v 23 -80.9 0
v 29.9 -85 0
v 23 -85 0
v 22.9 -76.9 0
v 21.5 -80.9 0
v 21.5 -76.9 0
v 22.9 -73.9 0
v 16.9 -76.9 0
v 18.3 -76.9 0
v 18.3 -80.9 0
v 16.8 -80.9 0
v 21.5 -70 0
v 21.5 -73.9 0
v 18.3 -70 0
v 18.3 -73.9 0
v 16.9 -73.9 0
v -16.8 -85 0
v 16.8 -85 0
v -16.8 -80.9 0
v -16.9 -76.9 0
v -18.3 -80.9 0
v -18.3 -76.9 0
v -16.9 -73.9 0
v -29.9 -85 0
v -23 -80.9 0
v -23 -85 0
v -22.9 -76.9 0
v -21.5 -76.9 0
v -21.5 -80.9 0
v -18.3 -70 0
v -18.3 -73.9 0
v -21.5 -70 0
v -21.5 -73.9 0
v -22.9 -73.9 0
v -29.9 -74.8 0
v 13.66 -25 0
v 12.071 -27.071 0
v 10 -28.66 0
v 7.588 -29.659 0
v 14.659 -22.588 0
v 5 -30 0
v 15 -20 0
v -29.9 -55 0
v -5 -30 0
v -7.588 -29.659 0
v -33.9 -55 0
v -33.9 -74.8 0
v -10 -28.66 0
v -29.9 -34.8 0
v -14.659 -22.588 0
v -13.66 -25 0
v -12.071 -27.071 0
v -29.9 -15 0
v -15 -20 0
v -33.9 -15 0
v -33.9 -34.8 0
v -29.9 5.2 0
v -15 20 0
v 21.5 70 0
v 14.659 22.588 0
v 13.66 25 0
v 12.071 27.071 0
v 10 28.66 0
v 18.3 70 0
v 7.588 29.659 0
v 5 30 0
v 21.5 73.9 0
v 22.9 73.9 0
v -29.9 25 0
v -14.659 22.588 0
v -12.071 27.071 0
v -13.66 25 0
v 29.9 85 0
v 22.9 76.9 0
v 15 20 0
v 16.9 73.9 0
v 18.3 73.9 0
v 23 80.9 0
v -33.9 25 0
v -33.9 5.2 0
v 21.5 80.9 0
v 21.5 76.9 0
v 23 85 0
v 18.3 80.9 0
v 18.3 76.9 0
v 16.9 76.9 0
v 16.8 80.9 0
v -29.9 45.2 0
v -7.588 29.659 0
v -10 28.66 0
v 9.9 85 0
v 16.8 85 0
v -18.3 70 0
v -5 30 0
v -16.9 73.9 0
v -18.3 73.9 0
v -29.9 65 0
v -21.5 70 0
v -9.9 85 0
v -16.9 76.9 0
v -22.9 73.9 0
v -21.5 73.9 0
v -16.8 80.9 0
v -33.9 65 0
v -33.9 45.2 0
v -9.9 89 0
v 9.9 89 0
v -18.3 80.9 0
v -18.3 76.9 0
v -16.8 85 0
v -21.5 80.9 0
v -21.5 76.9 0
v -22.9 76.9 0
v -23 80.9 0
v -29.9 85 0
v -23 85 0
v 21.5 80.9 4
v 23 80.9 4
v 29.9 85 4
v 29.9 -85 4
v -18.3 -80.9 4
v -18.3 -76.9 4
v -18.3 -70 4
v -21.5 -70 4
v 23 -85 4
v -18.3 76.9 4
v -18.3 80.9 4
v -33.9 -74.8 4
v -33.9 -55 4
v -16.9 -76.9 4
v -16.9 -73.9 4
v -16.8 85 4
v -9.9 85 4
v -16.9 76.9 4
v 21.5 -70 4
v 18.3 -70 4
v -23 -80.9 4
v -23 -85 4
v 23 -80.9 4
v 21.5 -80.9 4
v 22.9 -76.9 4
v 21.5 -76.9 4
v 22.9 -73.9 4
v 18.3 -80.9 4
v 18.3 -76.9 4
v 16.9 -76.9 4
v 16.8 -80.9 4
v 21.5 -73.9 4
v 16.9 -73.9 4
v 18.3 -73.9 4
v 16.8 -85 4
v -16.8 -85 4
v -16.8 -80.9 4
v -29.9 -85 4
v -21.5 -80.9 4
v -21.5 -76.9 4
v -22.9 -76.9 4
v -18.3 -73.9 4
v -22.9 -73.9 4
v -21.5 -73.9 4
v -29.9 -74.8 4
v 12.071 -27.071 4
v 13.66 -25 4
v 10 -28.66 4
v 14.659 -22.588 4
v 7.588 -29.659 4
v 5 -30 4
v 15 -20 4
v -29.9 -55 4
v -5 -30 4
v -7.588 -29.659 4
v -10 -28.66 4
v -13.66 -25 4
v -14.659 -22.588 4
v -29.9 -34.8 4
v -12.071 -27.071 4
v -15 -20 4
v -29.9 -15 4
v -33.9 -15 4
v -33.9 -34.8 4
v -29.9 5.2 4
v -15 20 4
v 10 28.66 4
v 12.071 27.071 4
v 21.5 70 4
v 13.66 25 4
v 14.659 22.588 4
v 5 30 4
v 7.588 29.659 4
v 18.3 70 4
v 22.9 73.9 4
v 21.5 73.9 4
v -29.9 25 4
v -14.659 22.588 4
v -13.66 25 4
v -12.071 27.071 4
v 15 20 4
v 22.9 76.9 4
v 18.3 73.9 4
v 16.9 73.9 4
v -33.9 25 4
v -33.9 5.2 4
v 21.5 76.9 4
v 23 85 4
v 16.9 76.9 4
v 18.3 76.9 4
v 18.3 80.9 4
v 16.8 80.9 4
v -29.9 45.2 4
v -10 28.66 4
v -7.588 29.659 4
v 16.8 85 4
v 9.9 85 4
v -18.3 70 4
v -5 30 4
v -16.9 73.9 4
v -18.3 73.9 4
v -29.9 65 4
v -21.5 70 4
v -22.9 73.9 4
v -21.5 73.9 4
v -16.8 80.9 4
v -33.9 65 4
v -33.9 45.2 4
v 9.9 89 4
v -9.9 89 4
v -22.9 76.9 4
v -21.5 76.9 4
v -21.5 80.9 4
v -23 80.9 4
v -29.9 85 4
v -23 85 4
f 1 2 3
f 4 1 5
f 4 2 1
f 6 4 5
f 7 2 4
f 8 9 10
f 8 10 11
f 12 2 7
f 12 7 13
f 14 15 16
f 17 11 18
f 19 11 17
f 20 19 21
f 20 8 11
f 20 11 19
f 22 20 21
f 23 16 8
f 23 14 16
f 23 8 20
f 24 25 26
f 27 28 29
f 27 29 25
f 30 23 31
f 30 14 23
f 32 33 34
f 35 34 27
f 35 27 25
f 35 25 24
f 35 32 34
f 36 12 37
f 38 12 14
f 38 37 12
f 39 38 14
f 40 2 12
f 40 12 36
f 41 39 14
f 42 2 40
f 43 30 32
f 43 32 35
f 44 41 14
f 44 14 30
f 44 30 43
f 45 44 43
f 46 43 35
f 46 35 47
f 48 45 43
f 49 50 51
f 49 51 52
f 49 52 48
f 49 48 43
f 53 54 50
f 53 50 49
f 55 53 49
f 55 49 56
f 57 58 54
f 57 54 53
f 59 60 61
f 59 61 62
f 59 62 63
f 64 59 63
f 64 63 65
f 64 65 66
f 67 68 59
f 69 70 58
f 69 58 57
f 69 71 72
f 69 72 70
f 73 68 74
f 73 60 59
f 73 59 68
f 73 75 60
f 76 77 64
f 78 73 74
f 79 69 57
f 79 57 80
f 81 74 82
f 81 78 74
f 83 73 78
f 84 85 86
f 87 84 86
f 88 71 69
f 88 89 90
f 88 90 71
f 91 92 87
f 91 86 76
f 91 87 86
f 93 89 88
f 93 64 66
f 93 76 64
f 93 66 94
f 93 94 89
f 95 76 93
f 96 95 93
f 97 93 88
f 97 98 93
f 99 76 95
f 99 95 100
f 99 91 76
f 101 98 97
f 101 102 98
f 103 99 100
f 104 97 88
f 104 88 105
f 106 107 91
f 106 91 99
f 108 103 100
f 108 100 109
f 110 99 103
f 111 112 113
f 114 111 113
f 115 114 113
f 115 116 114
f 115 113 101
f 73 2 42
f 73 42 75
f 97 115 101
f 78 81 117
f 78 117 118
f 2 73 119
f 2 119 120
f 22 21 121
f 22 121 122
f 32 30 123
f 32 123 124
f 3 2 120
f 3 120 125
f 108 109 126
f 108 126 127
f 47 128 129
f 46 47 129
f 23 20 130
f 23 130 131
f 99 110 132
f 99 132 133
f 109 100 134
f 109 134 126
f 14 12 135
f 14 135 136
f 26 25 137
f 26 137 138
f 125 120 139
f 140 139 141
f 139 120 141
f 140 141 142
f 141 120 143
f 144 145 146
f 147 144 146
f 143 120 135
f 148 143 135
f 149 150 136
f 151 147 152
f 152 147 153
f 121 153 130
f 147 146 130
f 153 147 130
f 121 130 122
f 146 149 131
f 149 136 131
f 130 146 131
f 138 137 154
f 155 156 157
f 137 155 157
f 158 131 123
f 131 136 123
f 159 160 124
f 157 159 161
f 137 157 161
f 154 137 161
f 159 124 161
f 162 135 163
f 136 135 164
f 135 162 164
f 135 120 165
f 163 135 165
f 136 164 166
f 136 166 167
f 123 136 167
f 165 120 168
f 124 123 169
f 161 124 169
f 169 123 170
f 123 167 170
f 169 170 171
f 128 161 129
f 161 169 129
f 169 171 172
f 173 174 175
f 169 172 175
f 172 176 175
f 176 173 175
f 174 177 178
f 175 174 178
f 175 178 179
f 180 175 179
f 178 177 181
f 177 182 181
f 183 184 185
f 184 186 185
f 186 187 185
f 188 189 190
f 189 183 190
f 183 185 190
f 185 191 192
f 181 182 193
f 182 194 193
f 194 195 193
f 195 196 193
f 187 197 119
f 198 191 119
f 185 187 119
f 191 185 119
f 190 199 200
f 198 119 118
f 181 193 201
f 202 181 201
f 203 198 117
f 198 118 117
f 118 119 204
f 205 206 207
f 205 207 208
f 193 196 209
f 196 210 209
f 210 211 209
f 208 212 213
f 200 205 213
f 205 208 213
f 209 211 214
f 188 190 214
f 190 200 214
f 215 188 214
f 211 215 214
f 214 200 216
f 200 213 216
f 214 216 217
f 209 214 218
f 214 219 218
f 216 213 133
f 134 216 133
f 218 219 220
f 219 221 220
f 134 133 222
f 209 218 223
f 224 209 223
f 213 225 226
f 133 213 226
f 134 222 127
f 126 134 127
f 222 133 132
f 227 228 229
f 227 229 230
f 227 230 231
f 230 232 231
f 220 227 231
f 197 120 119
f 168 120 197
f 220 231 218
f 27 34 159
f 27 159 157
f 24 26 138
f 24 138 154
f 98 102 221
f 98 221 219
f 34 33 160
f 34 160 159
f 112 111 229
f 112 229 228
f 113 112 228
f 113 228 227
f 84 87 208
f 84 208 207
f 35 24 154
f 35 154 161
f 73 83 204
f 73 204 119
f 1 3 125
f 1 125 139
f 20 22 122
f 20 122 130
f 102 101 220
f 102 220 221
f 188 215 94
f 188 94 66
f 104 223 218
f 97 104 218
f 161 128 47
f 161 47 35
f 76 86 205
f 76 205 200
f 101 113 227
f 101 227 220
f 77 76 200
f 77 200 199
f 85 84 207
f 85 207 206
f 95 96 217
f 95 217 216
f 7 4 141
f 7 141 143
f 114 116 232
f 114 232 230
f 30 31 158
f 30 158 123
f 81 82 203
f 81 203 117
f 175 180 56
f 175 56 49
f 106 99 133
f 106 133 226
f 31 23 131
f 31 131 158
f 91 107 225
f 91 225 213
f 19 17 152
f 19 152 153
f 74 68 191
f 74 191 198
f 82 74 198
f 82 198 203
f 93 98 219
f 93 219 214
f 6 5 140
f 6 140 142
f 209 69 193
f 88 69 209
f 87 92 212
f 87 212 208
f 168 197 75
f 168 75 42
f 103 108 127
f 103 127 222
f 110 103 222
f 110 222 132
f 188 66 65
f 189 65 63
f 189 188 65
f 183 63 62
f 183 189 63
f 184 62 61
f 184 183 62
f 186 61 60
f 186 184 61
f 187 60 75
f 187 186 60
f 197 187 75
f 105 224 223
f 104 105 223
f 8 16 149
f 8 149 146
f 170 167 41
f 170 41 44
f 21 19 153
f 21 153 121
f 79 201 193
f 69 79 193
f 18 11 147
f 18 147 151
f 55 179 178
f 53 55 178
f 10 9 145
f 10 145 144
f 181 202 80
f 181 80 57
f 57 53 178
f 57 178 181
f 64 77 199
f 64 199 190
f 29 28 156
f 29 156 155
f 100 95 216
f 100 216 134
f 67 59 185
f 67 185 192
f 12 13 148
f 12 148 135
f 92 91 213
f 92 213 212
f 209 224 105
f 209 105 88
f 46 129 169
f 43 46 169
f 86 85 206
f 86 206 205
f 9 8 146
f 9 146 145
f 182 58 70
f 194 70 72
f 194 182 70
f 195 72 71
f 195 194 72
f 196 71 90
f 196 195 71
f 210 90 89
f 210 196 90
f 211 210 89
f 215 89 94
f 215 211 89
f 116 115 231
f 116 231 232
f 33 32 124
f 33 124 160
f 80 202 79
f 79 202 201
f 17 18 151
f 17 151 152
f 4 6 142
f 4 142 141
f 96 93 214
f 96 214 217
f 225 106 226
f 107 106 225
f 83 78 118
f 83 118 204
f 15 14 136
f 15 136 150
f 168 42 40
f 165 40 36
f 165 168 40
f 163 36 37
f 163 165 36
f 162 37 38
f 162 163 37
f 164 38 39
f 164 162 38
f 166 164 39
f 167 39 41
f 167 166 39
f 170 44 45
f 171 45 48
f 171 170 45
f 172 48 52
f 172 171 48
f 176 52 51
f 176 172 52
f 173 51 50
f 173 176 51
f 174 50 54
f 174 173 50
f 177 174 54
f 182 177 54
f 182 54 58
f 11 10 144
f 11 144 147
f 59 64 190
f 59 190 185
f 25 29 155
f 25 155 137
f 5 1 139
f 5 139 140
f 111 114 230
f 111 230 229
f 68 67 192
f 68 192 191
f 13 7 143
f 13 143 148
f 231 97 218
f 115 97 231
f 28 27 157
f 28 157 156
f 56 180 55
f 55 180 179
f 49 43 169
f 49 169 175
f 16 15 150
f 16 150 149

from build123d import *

# Parameters (mm, degrees)
BOSS_EXTRUDE1_DEPTH = 4
CUT_EXTRUDE1_DEPTH  = 94.973453698
SKETCH5_W           = 4
SKETCH5_H           = 19.8
BOSS_EXTRUDE2_DEPTH = 4
CUT_EXTRUDE2_DEPTH  = 96.321613499


with BuildPart() as part:
    # Sketch1 → Boss-Extrude1 (new body)
    with BuildSketch(Plane.XY):
        Polygon((-9.9, 85), (-9.9, 89), (9.9, 89), (9.9, 85), (29.9, 85), (29.9, -85), (-29.9, -85), (-29.9, 85), align=None)
    extrude(amount=BOSS_EXTRUDE1_DEPTH)

    # Sketch3 → Cut-Extrude1 (cut, through all)
    with BuildSketch(Plane(origin=(0, 0, 0), x_dir=(-1, 0, 0), z_dir=(0, 0, -1))):
        Polygon((23, 85), (23, 80.9), (21.5, 80.9), (21.5, 76.9), (22.9, 76.9), (22.9, 73.9), (21.5, 73.9), (21.5, 70), (18.3, 70), (18.3, 73.9), (16.9, 73.9), (16.9, 76.9), (18.3, 76.9), (18.3, 80.9), (16.8, 80.9), (16.8, 85), align=None)
        Polygon((-16.8, 85), (-16.8, 80.9), (-18.3, 80.9), (-18.3, 76.9), (-16.9, 76.9), (-16.9, 73.9), (-18.3, 73.9), (-18.3, 70), (-21.5, 70), (-21.5, 73.9), (-22.9, 73.9), (-22.9, 76.9), (-21.5, 76.9), (-21.5, 80.9), (-23, 80.9), (-23, 85), align=None)
        Polygon((-23, -85), (-23, -80.9), (-21.5, -80.9), (-21.5, -76.9), (-22.9, -76.9), (-22.9, -73.9), (-21.5, -73.9), (-21.5, -70), (-18.3, -70), (-18.3, -73.9), (-16.9, -73.9), (-16.9, -76.9), (-18.3, -76.9), (-18.3, -80.9), (-16.8, -80.9), (-16.8, -85), align=None)
        Polygon((16.8, -85), (16.8, -80.9), (18.3, -80.9), (18.3, -76.9), (16.9, -76.9), (16.9, -73.9), (18.3, -73.9), (18.3, -70), (21.5, -70), (21.5, -73.9), (22.9, -73.9), (22.9, -76.9), (21.5, -76.9), (21.5, -80.9), (23, -80.9), (23, -85), align=None)
    extrude(amount=-CUT_EXTRUDE1_DEPTH, mode=Mode.SUBTRACT)

    # Sketch5 → Boss-Extrude2 (add)
    with BuildSketch(Plane.XY.offset(4)):
        with Locations((-31.9, 55.1)):
            Rectangle(SKETCH5_W, SKETCH5_H)
        with Locations((-31.9, 15.1)):
            Rectangle(SKETCH5_W, SKETCH5_H)
        with Locations((-31.9, -24.9)):
            Rectangle(SKETCH5_W, SKETCH5_H)
        with Locations((-31.9, -64.9)):
            Rectangle(SKETCH5_W, SKETCH5_H)
    extrude(amount=-BOSS_EXTRUDE2_DEPTH)

    # Sketch6 → Cut-Extrude2 (cut, through all)
    with BuildSketch(Plane.XY.offset(4)):
        with BuildLine():
            Line((-5, 30), (5, 30))
            ThreePointArc((5, 30), (12.071067812, 27.071067812), (15, 20))
            Line((15, 20), (15, -20))
            ThreePointArc((15, -20), (12.071067812, -27.071067812), (5, -30))
            Line((5, -30), (-5, -30))
            ThreePointArc((-5, -30), (-12.071067812, -27.071067812), (-15, -20))
            Line((-15, -20), (-15, 20))
            ThreePointArc((-15, 20), (-12.071067812, 27.071067812), (-5, 30))
        make_face()
    extrude(amount=-CUT_EXTRUDE2_DEPTH, mode=Mode.SUBTRACT)


solid = part.part
